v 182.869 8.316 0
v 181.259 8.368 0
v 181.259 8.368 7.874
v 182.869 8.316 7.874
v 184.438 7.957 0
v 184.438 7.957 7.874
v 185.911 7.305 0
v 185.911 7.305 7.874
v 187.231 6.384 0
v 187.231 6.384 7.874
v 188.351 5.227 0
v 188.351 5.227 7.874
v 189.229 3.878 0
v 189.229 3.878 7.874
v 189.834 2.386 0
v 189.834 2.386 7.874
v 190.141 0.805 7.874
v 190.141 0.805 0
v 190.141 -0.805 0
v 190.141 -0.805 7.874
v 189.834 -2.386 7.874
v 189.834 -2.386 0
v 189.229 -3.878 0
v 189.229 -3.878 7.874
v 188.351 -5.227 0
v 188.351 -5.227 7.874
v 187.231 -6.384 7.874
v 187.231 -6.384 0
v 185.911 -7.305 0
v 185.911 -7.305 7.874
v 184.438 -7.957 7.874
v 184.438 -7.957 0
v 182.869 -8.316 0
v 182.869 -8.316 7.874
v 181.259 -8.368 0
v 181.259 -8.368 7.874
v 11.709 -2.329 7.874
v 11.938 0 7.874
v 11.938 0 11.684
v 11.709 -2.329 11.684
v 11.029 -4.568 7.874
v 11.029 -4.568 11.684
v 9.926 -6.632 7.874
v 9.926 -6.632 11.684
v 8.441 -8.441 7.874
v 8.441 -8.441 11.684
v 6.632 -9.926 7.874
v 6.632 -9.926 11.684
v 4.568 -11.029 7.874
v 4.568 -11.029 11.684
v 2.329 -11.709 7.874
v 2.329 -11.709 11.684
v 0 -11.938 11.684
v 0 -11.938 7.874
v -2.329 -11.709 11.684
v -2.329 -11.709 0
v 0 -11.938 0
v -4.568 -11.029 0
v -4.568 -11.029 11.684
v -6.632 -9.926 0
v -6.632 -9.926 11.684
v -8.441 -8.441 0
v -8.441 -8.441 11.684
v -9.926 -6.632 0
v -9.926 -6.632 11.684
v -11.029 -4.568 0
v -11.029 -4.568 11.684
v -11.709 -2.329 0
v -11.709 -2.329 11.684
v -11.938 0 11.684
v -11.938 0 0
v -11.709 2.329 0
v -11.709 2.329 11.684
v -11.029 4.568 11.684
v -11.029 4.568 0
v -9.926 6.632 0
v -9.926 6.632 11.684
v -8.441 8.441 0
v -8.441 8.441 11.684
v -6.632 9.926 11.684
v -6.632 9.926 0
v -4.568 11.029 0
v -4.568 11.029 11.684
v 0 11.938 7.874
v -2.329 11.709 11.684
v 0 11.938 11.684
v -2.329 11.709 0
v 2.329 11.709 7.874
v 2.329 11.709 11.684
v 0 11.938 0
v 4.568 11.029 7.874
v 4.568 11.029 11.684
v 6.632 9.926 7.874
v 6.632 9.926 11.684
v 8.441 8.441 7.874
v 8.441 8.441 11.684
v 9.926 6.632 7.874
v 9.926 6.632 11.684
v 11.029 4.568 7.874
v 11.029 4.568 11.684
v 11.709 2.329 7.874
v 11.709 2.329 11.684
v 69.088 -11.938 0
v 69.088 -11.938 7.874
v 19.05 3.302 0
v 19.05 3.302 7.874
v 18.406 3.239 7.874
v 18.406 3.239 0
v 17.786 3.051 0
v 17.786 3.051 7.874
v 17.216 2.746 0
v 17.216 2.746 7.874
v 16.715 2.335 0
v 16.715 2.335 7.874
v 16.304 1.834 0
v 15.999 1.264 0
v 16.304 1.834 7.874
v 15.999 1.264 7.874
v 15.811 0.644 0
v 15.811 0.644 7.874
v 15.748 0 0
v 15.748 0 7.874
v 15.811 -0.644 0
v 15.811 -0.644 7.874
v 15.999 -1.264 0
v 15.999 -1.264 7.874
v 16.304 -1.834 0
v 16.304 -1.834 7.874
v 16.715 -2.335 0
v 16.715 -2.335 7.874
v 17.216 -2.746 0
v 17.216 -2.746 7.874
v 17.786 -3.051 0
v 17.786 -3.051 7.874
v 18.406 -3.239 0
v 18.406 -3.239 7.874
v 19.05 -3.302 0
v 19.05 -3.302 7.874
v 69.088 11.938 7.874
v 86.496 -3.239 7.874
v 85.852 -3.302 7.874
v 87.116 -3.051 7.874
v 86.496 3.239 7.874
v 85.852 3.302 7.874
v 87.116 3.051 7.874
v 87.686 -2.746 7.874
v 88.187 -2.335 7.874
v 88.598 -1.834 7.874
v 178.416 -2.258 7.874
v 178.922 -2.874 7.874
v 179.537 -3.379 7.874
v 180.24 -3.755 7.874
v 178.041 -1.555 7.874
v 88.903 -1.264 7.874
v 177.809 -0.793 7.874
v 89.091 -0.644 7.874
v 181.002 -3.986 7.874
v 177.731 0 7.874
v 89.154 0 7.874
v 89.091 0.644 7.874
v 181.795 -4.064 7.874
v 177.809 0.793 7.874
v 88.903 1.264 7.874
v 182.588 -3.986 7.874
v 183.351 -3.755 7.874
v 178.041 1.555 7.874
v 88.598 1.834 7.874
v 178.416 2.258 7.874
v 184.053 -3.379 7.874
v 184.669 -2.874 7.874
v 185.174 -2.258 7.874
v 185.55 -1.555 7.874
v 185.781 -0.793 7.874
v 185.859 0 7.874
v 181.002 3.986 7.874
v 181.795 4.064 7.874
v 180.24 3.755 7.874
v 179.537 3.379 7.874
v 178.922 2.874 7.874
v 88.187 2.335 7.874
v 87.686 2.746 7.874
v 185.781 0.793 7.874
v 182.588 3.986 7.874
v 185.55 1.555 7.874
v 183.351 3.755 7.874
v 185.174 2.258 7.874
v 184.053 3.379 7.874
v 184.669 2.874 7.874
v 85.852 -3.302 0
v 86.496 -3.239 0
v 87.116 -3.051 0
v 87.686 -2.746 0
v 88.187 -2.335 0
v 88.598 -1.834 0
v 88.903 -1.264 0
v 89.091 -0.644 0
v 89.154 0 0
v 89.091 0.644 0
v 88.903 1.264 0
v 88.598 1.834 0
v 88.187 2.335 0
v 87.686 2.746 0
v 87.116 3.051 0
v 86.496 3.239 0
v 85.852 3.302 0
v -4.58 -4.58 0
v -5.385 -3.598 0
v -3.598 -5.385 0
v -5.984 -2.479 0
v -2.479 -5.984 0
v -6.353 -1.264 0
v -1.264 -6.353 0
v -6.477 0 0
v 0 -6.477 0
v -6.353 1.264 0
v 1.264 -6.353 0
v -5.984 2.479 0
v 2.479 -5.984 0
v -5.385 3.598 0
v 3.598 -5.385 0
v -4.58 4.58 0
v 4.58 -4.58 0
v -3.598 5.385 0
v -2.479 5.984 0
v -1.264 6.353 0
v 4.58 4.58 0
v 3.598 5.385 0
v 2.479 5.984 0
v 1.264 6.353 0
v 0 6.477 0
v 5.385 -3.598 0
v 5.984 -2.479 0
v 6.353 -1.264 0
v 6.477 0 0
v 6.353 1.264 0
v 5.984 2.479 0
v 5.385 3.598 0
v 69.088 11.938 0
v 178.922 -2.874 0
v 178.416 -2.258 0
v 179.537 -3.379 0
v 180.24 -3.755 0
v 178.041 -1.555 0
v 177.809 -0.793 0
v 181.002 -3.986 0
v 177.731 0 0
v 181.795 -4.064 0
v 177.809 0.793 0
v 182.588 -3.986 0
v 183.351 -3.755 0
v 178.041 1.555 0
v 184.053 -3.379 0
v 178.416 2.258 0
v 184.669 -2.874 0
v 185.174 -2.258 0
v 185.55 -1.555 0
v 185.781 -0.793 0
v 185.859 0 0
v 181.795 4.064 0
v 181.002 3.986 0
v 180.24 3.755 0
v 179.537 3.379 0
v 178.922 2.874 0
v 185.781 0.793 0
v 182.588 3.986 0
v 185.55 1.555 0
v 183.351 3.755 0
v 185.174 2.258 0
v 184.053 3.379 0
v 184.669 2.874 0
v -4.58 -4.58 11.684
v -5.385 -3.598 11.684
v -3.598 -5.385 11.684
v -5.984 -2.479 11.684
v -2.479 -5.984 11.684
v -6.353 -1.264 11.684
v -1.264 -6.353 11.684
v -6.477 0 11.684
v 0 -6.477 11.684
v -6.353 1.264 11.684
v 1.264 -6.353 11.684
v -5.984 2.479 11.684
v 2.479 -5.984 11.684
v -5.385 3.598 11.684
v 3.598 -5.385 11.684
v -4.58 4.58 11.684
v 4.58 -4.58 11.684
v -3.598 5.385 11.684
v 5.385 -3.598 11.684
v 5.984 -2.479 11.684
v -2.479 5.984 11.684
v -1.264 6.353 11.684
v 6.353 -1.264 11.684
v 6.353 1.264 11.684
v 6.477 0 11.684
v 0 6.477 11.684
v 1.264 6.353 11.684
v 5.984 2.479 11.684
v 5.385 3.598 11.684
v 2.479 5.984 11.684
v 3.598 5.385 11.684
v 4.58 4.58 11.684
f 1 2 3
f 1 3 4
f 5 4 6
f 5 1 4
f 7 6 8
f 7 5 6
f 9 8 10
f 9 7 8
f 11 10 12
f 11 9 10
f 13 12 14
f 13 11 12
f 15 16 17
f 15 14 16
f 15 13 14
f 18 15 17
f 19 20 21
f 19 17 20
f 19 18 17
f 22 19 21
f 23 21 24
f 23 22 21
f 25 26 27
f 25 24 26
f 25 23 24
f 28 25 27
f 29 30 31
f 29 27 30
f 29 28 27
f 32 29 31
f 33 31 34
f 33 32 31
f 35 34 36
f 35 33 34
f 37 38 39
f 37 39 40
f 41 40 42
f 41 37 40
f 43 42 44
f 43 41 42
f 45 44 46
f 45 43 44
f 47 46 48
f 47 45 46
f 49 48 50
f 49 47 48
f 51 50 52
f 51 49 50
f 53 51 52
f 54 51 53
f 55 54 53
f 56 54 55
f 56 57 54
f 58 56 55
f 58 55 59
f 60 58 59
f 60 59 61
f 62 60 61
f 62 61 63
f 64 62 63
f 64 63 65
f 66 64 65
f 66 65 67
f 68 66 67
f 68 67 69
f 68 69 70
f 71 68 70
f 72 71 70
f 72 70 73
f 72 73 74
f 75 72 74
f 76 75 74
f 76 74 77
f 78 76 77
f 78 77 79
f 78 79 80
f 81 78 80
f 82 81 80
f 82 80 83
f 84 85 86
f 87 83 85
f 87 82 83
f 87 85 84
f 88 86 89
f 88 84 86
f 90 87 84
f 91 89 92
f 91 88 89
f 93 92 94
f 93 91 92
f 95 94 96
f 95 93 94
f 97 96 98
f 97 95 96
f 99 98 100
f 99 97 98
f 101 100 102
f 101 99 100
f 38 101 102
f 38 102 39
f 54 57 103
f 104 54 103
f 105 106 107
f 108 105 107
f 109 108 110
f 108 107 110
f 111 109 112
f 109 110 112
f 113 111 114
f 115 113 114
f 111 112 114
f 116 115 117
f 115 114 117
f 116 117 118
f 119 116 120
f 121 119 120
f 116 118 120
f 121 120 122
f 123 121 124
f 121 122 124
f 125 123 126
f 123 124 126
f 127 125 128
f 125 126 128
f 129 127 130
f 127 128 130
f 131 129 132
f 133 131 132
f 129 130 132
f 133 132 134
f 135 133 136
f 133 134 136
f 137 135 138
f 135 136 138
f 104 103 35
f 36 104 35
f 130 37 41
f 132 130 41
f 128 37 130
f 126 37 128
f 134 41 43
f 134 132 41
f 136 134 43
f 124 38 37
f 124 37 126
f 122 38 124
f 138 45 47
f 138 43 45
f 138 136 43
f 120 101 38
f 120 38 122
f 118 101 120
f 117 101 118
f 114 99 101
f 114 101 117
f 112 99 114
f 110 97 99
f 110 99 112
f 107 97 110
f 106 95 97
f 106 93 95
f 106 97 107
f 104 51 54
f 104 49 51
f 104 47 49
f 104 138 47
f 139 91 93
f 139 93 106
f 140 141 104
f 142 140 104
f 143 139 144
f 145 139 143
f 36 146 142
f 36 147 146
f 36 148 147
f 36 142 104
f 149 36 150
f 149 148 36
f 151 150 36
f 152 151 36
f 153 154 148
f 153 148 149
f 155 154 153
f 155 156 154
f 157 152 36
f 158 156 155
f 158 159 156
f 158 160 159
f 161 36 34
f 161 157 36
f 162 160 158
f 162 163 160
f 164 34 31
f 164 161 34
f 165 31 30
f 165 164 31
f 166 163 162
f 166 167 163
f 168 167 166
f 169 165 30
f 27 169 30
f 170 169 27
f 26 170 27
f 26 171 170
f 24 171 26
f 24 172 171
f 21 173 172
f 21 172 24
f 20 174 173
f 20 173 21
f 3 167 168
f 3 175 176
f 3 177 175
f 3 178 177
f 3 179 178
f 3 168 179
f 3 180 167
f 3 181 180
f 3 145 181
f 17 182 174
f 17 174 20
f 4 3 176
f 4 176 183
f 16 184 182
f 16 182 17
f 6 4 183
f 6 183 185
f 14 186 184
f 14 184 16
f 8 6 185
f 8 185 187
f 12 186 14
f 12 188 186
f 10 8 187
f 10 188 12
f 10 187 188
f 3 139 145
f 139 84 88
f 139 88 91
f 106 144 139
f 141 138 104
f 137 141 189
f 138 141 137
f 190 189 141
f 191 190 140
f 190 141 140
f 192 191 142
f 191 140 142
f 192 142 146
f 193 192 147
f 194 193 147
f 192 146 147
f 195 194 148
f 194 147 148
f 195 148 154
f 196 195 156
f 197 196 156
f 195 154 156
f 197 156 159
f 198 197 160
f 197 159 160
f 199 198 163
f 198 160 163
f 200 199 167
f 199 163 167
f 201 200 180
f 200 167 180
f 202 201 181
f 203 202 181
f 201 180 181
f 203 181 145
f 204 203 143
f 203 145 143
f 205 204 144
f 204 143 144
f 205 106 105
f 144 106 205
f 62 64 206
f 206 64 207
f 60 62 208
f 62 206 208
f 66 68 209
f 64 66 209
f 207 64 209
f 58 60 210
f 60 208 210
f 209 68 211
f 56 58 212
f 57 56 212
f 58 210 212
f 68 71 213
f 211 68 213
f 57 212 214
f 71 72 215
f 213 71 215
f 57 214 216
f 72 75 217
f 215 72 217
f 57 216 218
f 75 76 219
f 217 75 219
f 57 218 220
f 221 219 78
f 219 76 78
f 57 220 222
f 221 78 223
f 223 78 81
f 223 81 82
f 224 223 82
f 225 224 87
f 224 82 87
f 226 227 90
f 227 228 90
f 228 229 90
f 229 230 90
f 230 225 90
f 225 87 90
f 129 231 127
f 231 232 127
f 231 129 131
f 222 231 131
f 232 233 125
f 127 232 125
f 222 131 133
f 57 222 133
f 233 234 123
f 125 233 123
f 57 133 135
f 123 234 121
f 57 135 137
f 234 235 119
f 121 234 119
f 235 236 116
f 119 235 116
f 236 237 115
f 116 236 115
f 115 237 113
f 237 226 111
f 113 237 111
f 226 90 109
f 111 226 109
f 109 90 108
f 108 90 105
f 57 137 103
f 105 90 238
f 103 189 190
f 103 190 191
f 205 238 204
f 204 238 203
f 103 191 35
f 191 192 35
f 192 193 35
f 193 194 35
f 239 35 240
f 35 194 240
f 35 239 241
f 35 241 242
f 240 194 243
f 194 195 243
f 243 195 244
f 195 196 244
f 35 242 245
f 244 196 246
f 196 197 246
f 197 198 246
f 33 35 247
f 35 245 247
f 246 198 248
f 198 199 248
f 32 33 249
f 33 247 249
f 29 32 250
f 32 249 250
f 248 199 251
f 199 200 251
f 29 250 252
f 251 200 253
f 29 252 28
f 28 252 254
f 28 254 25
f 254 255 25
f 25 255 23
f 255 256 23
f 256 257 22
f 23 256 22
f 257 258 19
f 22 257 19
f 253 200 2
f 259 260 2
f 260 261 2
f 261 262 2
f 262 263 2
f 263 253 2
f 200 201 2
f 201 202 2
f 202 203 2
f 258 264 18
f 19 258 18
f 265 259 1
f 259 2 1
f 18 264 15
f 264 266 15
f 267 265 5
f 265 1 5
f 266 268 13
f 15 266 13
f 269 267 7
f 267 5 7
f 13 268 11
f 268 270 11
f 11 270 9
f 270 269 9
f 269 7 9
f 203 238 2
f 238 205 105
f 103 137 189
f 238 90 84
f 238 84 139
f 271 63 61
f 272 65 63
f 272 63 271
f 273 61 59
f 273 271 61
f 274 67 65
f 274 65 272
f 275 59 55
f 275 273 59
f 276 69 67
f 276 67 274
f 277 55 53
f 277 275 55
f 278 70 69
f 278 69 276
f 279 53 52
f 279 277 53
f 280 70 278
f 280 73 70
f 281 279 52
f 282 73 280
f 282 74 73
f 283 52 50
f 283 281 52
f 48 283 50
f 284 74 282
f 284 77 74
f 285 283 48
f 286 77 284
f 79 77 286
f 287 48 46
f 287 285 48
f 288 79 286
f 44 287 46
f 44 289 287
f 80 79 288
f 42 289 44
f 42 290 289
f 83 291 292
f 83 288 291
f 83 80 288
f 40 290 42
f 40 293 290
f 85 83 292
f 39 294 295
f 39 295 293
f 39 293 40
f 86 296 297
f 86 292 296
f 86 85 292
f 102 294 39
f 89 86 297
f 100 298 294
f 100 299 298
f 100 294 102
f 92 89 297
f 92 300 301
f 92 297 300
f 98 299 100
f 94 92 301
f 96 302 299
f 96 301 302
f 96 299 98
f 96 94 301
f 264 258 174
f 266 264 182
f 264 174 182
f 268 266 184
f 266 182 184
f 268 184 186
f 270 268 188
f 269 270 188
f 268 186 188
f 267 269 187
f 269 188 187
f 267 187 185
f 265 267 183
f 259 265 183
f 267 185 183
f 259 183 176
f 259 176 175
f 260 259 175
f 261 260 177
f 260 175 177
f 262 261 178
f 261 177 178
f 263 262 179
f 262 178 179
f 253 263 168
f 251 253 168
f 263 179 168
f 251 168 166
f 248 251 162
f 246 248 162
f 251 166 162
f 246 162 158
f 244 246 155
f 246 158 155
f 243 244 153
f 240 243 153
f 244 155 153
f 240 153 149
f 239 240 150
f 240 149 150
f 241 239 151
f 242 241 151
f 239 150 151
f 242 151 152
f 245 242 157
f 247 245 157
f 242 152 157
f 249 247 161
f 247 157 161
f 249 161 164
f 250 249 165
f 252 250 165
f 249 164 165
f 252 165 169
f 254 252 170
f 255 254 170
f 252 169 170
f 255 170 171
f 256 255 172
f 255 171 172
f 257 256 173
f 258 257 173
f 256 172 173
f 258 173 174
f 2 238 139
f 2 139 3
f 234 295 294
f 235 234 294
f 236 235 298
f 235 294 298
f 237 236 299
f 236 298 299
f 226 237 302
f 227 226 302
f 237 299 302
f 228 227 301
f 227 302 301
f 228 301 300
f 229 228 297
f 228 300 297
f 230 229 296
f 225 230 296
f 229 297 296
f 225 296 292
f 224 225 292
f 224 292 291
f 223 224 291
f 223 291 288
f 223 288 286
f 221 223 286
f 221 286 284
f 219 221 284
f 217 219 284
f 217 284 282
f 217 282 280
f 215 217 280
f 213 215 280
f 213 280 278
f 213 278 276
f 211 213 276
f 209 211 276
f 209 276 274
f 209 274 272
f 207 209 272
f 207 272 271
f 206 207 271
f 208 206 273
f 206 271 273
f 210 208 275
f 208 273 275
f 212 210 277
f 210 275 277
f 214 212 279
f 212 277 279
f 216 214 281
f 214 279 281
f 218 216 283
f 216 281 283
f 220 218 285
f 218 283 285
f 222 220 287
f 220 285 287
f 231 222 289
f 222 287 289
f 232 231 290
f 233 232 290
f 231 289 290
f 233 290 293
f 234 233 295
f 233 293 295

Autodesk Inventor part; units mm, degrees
ref_plane "YZ Plane" through (0, 0, 0) normal (1, 0, 0) x (0, 1, 0)
ref_plane "XZ Plane" through (0, 0, 0) normal (0, 1, 0) x (-1, 0, 0)
sketch "Sketch1" plane through (0, 0, 0) normal (0, 0, 1) x (1, 0, 0)
  circle A0 centre (0, 0) radius 11.938
  line L0 (0, -11.938) -> (69.088, -11.938)
  line L1 (0, 11.938) -> (69.088, 11.938)
  line L2 (69.088, 11.938) -> (182.0608, 8.3422)
  line L3 (69.088, -11.938) -> (182.0608, -8.3422)
  arc A1 (181.2593, -8.3677) -> (181.2593, 8.3677) centre (181.7953, 0) ccw
  dimension "d0" = 23.876
extrude "Extrusion1" add sketch "Sketch1" along normal blind 11.684 contours A0
extrude "Extrusion2" add sketch "Sketch1" along normal blind 7.874 contours A0 L1 L2 A1 L3 L0
sketch "Sketch2" plane through (0, 0, 7.874) normal (0, 0, 1) x (1, 0, 0)
  line L0 (181.2593, 8.3677) -> (69.088, 11.938) projected
  arc A0 (181.2593, -8.3677) -> (181.2593, 8.3677) centre (181.7953, 0) ccw projected
  line L1 (69.088, -11.938) -> (181.2593, -8.3677) projected
  line L2 (69.088, 11.938) -> (0, 11.938) projected
  line L3 (0, -11.938) -> (69.088, -11.938) projected
  line L4 (69.088, -11.938) -> (181.2593, -8.3677) projected
  arc A1 (181.2593, -8.3677) -> (181.2593, 8.3677) centre (181.7953, 0) ccw projected
  line L5 (181.2593, 8.3677) -> (69.088, 11.938) projected
  line L6 (69.088, 11.938) -> (0, 11.938) projected
  arc A2 (0, -11.938) -> (0, 11.938) centre (0, 0) ccw projected
  circle A3 centre (181.7953, 0) radius 4.064
  line L7 (0, 0) -> (15.748, 0) construction
  line L8 (15.748, 0) -> (19.05, 0)
  arc A4 (19.05, 3.302) -> (19.05, -3.302) centre (19.05, 0) ccw
  line L9 (19.05, 3.302) -> (85.852, 3.302)
  arc A5 (85.852, -3.302) -> (85.852, 3.302) centre (85.852, 0) ccw
  line L10 (85.852, -3.302) -> (19.05, -3.302)
  dimension "d7" = 8.128
  dimension "d8" = 15.748
  dimension "d10" = 3.302
  dimension "d11" = 66.802
extrude "Extrusion3" cut sketch "Sketch2" against normal up to next contours A3 | L9 A5 L10 A4
sketch "Sketch3" plane through (0, 0, 11.684) normal (0, 0, 1) x (1, 0, 0)
  circle A0 centre (0, 0) radius 6.477
  dimension "d14" = 12.954
extrude "Extrusion4" cut sketch "Sketch3" against normal up to next
ref_plane "Work Plane1" through (0, 0, 3.937) normal (0, 0, 1) x (1, 0, 0)
properties part number "lever"
